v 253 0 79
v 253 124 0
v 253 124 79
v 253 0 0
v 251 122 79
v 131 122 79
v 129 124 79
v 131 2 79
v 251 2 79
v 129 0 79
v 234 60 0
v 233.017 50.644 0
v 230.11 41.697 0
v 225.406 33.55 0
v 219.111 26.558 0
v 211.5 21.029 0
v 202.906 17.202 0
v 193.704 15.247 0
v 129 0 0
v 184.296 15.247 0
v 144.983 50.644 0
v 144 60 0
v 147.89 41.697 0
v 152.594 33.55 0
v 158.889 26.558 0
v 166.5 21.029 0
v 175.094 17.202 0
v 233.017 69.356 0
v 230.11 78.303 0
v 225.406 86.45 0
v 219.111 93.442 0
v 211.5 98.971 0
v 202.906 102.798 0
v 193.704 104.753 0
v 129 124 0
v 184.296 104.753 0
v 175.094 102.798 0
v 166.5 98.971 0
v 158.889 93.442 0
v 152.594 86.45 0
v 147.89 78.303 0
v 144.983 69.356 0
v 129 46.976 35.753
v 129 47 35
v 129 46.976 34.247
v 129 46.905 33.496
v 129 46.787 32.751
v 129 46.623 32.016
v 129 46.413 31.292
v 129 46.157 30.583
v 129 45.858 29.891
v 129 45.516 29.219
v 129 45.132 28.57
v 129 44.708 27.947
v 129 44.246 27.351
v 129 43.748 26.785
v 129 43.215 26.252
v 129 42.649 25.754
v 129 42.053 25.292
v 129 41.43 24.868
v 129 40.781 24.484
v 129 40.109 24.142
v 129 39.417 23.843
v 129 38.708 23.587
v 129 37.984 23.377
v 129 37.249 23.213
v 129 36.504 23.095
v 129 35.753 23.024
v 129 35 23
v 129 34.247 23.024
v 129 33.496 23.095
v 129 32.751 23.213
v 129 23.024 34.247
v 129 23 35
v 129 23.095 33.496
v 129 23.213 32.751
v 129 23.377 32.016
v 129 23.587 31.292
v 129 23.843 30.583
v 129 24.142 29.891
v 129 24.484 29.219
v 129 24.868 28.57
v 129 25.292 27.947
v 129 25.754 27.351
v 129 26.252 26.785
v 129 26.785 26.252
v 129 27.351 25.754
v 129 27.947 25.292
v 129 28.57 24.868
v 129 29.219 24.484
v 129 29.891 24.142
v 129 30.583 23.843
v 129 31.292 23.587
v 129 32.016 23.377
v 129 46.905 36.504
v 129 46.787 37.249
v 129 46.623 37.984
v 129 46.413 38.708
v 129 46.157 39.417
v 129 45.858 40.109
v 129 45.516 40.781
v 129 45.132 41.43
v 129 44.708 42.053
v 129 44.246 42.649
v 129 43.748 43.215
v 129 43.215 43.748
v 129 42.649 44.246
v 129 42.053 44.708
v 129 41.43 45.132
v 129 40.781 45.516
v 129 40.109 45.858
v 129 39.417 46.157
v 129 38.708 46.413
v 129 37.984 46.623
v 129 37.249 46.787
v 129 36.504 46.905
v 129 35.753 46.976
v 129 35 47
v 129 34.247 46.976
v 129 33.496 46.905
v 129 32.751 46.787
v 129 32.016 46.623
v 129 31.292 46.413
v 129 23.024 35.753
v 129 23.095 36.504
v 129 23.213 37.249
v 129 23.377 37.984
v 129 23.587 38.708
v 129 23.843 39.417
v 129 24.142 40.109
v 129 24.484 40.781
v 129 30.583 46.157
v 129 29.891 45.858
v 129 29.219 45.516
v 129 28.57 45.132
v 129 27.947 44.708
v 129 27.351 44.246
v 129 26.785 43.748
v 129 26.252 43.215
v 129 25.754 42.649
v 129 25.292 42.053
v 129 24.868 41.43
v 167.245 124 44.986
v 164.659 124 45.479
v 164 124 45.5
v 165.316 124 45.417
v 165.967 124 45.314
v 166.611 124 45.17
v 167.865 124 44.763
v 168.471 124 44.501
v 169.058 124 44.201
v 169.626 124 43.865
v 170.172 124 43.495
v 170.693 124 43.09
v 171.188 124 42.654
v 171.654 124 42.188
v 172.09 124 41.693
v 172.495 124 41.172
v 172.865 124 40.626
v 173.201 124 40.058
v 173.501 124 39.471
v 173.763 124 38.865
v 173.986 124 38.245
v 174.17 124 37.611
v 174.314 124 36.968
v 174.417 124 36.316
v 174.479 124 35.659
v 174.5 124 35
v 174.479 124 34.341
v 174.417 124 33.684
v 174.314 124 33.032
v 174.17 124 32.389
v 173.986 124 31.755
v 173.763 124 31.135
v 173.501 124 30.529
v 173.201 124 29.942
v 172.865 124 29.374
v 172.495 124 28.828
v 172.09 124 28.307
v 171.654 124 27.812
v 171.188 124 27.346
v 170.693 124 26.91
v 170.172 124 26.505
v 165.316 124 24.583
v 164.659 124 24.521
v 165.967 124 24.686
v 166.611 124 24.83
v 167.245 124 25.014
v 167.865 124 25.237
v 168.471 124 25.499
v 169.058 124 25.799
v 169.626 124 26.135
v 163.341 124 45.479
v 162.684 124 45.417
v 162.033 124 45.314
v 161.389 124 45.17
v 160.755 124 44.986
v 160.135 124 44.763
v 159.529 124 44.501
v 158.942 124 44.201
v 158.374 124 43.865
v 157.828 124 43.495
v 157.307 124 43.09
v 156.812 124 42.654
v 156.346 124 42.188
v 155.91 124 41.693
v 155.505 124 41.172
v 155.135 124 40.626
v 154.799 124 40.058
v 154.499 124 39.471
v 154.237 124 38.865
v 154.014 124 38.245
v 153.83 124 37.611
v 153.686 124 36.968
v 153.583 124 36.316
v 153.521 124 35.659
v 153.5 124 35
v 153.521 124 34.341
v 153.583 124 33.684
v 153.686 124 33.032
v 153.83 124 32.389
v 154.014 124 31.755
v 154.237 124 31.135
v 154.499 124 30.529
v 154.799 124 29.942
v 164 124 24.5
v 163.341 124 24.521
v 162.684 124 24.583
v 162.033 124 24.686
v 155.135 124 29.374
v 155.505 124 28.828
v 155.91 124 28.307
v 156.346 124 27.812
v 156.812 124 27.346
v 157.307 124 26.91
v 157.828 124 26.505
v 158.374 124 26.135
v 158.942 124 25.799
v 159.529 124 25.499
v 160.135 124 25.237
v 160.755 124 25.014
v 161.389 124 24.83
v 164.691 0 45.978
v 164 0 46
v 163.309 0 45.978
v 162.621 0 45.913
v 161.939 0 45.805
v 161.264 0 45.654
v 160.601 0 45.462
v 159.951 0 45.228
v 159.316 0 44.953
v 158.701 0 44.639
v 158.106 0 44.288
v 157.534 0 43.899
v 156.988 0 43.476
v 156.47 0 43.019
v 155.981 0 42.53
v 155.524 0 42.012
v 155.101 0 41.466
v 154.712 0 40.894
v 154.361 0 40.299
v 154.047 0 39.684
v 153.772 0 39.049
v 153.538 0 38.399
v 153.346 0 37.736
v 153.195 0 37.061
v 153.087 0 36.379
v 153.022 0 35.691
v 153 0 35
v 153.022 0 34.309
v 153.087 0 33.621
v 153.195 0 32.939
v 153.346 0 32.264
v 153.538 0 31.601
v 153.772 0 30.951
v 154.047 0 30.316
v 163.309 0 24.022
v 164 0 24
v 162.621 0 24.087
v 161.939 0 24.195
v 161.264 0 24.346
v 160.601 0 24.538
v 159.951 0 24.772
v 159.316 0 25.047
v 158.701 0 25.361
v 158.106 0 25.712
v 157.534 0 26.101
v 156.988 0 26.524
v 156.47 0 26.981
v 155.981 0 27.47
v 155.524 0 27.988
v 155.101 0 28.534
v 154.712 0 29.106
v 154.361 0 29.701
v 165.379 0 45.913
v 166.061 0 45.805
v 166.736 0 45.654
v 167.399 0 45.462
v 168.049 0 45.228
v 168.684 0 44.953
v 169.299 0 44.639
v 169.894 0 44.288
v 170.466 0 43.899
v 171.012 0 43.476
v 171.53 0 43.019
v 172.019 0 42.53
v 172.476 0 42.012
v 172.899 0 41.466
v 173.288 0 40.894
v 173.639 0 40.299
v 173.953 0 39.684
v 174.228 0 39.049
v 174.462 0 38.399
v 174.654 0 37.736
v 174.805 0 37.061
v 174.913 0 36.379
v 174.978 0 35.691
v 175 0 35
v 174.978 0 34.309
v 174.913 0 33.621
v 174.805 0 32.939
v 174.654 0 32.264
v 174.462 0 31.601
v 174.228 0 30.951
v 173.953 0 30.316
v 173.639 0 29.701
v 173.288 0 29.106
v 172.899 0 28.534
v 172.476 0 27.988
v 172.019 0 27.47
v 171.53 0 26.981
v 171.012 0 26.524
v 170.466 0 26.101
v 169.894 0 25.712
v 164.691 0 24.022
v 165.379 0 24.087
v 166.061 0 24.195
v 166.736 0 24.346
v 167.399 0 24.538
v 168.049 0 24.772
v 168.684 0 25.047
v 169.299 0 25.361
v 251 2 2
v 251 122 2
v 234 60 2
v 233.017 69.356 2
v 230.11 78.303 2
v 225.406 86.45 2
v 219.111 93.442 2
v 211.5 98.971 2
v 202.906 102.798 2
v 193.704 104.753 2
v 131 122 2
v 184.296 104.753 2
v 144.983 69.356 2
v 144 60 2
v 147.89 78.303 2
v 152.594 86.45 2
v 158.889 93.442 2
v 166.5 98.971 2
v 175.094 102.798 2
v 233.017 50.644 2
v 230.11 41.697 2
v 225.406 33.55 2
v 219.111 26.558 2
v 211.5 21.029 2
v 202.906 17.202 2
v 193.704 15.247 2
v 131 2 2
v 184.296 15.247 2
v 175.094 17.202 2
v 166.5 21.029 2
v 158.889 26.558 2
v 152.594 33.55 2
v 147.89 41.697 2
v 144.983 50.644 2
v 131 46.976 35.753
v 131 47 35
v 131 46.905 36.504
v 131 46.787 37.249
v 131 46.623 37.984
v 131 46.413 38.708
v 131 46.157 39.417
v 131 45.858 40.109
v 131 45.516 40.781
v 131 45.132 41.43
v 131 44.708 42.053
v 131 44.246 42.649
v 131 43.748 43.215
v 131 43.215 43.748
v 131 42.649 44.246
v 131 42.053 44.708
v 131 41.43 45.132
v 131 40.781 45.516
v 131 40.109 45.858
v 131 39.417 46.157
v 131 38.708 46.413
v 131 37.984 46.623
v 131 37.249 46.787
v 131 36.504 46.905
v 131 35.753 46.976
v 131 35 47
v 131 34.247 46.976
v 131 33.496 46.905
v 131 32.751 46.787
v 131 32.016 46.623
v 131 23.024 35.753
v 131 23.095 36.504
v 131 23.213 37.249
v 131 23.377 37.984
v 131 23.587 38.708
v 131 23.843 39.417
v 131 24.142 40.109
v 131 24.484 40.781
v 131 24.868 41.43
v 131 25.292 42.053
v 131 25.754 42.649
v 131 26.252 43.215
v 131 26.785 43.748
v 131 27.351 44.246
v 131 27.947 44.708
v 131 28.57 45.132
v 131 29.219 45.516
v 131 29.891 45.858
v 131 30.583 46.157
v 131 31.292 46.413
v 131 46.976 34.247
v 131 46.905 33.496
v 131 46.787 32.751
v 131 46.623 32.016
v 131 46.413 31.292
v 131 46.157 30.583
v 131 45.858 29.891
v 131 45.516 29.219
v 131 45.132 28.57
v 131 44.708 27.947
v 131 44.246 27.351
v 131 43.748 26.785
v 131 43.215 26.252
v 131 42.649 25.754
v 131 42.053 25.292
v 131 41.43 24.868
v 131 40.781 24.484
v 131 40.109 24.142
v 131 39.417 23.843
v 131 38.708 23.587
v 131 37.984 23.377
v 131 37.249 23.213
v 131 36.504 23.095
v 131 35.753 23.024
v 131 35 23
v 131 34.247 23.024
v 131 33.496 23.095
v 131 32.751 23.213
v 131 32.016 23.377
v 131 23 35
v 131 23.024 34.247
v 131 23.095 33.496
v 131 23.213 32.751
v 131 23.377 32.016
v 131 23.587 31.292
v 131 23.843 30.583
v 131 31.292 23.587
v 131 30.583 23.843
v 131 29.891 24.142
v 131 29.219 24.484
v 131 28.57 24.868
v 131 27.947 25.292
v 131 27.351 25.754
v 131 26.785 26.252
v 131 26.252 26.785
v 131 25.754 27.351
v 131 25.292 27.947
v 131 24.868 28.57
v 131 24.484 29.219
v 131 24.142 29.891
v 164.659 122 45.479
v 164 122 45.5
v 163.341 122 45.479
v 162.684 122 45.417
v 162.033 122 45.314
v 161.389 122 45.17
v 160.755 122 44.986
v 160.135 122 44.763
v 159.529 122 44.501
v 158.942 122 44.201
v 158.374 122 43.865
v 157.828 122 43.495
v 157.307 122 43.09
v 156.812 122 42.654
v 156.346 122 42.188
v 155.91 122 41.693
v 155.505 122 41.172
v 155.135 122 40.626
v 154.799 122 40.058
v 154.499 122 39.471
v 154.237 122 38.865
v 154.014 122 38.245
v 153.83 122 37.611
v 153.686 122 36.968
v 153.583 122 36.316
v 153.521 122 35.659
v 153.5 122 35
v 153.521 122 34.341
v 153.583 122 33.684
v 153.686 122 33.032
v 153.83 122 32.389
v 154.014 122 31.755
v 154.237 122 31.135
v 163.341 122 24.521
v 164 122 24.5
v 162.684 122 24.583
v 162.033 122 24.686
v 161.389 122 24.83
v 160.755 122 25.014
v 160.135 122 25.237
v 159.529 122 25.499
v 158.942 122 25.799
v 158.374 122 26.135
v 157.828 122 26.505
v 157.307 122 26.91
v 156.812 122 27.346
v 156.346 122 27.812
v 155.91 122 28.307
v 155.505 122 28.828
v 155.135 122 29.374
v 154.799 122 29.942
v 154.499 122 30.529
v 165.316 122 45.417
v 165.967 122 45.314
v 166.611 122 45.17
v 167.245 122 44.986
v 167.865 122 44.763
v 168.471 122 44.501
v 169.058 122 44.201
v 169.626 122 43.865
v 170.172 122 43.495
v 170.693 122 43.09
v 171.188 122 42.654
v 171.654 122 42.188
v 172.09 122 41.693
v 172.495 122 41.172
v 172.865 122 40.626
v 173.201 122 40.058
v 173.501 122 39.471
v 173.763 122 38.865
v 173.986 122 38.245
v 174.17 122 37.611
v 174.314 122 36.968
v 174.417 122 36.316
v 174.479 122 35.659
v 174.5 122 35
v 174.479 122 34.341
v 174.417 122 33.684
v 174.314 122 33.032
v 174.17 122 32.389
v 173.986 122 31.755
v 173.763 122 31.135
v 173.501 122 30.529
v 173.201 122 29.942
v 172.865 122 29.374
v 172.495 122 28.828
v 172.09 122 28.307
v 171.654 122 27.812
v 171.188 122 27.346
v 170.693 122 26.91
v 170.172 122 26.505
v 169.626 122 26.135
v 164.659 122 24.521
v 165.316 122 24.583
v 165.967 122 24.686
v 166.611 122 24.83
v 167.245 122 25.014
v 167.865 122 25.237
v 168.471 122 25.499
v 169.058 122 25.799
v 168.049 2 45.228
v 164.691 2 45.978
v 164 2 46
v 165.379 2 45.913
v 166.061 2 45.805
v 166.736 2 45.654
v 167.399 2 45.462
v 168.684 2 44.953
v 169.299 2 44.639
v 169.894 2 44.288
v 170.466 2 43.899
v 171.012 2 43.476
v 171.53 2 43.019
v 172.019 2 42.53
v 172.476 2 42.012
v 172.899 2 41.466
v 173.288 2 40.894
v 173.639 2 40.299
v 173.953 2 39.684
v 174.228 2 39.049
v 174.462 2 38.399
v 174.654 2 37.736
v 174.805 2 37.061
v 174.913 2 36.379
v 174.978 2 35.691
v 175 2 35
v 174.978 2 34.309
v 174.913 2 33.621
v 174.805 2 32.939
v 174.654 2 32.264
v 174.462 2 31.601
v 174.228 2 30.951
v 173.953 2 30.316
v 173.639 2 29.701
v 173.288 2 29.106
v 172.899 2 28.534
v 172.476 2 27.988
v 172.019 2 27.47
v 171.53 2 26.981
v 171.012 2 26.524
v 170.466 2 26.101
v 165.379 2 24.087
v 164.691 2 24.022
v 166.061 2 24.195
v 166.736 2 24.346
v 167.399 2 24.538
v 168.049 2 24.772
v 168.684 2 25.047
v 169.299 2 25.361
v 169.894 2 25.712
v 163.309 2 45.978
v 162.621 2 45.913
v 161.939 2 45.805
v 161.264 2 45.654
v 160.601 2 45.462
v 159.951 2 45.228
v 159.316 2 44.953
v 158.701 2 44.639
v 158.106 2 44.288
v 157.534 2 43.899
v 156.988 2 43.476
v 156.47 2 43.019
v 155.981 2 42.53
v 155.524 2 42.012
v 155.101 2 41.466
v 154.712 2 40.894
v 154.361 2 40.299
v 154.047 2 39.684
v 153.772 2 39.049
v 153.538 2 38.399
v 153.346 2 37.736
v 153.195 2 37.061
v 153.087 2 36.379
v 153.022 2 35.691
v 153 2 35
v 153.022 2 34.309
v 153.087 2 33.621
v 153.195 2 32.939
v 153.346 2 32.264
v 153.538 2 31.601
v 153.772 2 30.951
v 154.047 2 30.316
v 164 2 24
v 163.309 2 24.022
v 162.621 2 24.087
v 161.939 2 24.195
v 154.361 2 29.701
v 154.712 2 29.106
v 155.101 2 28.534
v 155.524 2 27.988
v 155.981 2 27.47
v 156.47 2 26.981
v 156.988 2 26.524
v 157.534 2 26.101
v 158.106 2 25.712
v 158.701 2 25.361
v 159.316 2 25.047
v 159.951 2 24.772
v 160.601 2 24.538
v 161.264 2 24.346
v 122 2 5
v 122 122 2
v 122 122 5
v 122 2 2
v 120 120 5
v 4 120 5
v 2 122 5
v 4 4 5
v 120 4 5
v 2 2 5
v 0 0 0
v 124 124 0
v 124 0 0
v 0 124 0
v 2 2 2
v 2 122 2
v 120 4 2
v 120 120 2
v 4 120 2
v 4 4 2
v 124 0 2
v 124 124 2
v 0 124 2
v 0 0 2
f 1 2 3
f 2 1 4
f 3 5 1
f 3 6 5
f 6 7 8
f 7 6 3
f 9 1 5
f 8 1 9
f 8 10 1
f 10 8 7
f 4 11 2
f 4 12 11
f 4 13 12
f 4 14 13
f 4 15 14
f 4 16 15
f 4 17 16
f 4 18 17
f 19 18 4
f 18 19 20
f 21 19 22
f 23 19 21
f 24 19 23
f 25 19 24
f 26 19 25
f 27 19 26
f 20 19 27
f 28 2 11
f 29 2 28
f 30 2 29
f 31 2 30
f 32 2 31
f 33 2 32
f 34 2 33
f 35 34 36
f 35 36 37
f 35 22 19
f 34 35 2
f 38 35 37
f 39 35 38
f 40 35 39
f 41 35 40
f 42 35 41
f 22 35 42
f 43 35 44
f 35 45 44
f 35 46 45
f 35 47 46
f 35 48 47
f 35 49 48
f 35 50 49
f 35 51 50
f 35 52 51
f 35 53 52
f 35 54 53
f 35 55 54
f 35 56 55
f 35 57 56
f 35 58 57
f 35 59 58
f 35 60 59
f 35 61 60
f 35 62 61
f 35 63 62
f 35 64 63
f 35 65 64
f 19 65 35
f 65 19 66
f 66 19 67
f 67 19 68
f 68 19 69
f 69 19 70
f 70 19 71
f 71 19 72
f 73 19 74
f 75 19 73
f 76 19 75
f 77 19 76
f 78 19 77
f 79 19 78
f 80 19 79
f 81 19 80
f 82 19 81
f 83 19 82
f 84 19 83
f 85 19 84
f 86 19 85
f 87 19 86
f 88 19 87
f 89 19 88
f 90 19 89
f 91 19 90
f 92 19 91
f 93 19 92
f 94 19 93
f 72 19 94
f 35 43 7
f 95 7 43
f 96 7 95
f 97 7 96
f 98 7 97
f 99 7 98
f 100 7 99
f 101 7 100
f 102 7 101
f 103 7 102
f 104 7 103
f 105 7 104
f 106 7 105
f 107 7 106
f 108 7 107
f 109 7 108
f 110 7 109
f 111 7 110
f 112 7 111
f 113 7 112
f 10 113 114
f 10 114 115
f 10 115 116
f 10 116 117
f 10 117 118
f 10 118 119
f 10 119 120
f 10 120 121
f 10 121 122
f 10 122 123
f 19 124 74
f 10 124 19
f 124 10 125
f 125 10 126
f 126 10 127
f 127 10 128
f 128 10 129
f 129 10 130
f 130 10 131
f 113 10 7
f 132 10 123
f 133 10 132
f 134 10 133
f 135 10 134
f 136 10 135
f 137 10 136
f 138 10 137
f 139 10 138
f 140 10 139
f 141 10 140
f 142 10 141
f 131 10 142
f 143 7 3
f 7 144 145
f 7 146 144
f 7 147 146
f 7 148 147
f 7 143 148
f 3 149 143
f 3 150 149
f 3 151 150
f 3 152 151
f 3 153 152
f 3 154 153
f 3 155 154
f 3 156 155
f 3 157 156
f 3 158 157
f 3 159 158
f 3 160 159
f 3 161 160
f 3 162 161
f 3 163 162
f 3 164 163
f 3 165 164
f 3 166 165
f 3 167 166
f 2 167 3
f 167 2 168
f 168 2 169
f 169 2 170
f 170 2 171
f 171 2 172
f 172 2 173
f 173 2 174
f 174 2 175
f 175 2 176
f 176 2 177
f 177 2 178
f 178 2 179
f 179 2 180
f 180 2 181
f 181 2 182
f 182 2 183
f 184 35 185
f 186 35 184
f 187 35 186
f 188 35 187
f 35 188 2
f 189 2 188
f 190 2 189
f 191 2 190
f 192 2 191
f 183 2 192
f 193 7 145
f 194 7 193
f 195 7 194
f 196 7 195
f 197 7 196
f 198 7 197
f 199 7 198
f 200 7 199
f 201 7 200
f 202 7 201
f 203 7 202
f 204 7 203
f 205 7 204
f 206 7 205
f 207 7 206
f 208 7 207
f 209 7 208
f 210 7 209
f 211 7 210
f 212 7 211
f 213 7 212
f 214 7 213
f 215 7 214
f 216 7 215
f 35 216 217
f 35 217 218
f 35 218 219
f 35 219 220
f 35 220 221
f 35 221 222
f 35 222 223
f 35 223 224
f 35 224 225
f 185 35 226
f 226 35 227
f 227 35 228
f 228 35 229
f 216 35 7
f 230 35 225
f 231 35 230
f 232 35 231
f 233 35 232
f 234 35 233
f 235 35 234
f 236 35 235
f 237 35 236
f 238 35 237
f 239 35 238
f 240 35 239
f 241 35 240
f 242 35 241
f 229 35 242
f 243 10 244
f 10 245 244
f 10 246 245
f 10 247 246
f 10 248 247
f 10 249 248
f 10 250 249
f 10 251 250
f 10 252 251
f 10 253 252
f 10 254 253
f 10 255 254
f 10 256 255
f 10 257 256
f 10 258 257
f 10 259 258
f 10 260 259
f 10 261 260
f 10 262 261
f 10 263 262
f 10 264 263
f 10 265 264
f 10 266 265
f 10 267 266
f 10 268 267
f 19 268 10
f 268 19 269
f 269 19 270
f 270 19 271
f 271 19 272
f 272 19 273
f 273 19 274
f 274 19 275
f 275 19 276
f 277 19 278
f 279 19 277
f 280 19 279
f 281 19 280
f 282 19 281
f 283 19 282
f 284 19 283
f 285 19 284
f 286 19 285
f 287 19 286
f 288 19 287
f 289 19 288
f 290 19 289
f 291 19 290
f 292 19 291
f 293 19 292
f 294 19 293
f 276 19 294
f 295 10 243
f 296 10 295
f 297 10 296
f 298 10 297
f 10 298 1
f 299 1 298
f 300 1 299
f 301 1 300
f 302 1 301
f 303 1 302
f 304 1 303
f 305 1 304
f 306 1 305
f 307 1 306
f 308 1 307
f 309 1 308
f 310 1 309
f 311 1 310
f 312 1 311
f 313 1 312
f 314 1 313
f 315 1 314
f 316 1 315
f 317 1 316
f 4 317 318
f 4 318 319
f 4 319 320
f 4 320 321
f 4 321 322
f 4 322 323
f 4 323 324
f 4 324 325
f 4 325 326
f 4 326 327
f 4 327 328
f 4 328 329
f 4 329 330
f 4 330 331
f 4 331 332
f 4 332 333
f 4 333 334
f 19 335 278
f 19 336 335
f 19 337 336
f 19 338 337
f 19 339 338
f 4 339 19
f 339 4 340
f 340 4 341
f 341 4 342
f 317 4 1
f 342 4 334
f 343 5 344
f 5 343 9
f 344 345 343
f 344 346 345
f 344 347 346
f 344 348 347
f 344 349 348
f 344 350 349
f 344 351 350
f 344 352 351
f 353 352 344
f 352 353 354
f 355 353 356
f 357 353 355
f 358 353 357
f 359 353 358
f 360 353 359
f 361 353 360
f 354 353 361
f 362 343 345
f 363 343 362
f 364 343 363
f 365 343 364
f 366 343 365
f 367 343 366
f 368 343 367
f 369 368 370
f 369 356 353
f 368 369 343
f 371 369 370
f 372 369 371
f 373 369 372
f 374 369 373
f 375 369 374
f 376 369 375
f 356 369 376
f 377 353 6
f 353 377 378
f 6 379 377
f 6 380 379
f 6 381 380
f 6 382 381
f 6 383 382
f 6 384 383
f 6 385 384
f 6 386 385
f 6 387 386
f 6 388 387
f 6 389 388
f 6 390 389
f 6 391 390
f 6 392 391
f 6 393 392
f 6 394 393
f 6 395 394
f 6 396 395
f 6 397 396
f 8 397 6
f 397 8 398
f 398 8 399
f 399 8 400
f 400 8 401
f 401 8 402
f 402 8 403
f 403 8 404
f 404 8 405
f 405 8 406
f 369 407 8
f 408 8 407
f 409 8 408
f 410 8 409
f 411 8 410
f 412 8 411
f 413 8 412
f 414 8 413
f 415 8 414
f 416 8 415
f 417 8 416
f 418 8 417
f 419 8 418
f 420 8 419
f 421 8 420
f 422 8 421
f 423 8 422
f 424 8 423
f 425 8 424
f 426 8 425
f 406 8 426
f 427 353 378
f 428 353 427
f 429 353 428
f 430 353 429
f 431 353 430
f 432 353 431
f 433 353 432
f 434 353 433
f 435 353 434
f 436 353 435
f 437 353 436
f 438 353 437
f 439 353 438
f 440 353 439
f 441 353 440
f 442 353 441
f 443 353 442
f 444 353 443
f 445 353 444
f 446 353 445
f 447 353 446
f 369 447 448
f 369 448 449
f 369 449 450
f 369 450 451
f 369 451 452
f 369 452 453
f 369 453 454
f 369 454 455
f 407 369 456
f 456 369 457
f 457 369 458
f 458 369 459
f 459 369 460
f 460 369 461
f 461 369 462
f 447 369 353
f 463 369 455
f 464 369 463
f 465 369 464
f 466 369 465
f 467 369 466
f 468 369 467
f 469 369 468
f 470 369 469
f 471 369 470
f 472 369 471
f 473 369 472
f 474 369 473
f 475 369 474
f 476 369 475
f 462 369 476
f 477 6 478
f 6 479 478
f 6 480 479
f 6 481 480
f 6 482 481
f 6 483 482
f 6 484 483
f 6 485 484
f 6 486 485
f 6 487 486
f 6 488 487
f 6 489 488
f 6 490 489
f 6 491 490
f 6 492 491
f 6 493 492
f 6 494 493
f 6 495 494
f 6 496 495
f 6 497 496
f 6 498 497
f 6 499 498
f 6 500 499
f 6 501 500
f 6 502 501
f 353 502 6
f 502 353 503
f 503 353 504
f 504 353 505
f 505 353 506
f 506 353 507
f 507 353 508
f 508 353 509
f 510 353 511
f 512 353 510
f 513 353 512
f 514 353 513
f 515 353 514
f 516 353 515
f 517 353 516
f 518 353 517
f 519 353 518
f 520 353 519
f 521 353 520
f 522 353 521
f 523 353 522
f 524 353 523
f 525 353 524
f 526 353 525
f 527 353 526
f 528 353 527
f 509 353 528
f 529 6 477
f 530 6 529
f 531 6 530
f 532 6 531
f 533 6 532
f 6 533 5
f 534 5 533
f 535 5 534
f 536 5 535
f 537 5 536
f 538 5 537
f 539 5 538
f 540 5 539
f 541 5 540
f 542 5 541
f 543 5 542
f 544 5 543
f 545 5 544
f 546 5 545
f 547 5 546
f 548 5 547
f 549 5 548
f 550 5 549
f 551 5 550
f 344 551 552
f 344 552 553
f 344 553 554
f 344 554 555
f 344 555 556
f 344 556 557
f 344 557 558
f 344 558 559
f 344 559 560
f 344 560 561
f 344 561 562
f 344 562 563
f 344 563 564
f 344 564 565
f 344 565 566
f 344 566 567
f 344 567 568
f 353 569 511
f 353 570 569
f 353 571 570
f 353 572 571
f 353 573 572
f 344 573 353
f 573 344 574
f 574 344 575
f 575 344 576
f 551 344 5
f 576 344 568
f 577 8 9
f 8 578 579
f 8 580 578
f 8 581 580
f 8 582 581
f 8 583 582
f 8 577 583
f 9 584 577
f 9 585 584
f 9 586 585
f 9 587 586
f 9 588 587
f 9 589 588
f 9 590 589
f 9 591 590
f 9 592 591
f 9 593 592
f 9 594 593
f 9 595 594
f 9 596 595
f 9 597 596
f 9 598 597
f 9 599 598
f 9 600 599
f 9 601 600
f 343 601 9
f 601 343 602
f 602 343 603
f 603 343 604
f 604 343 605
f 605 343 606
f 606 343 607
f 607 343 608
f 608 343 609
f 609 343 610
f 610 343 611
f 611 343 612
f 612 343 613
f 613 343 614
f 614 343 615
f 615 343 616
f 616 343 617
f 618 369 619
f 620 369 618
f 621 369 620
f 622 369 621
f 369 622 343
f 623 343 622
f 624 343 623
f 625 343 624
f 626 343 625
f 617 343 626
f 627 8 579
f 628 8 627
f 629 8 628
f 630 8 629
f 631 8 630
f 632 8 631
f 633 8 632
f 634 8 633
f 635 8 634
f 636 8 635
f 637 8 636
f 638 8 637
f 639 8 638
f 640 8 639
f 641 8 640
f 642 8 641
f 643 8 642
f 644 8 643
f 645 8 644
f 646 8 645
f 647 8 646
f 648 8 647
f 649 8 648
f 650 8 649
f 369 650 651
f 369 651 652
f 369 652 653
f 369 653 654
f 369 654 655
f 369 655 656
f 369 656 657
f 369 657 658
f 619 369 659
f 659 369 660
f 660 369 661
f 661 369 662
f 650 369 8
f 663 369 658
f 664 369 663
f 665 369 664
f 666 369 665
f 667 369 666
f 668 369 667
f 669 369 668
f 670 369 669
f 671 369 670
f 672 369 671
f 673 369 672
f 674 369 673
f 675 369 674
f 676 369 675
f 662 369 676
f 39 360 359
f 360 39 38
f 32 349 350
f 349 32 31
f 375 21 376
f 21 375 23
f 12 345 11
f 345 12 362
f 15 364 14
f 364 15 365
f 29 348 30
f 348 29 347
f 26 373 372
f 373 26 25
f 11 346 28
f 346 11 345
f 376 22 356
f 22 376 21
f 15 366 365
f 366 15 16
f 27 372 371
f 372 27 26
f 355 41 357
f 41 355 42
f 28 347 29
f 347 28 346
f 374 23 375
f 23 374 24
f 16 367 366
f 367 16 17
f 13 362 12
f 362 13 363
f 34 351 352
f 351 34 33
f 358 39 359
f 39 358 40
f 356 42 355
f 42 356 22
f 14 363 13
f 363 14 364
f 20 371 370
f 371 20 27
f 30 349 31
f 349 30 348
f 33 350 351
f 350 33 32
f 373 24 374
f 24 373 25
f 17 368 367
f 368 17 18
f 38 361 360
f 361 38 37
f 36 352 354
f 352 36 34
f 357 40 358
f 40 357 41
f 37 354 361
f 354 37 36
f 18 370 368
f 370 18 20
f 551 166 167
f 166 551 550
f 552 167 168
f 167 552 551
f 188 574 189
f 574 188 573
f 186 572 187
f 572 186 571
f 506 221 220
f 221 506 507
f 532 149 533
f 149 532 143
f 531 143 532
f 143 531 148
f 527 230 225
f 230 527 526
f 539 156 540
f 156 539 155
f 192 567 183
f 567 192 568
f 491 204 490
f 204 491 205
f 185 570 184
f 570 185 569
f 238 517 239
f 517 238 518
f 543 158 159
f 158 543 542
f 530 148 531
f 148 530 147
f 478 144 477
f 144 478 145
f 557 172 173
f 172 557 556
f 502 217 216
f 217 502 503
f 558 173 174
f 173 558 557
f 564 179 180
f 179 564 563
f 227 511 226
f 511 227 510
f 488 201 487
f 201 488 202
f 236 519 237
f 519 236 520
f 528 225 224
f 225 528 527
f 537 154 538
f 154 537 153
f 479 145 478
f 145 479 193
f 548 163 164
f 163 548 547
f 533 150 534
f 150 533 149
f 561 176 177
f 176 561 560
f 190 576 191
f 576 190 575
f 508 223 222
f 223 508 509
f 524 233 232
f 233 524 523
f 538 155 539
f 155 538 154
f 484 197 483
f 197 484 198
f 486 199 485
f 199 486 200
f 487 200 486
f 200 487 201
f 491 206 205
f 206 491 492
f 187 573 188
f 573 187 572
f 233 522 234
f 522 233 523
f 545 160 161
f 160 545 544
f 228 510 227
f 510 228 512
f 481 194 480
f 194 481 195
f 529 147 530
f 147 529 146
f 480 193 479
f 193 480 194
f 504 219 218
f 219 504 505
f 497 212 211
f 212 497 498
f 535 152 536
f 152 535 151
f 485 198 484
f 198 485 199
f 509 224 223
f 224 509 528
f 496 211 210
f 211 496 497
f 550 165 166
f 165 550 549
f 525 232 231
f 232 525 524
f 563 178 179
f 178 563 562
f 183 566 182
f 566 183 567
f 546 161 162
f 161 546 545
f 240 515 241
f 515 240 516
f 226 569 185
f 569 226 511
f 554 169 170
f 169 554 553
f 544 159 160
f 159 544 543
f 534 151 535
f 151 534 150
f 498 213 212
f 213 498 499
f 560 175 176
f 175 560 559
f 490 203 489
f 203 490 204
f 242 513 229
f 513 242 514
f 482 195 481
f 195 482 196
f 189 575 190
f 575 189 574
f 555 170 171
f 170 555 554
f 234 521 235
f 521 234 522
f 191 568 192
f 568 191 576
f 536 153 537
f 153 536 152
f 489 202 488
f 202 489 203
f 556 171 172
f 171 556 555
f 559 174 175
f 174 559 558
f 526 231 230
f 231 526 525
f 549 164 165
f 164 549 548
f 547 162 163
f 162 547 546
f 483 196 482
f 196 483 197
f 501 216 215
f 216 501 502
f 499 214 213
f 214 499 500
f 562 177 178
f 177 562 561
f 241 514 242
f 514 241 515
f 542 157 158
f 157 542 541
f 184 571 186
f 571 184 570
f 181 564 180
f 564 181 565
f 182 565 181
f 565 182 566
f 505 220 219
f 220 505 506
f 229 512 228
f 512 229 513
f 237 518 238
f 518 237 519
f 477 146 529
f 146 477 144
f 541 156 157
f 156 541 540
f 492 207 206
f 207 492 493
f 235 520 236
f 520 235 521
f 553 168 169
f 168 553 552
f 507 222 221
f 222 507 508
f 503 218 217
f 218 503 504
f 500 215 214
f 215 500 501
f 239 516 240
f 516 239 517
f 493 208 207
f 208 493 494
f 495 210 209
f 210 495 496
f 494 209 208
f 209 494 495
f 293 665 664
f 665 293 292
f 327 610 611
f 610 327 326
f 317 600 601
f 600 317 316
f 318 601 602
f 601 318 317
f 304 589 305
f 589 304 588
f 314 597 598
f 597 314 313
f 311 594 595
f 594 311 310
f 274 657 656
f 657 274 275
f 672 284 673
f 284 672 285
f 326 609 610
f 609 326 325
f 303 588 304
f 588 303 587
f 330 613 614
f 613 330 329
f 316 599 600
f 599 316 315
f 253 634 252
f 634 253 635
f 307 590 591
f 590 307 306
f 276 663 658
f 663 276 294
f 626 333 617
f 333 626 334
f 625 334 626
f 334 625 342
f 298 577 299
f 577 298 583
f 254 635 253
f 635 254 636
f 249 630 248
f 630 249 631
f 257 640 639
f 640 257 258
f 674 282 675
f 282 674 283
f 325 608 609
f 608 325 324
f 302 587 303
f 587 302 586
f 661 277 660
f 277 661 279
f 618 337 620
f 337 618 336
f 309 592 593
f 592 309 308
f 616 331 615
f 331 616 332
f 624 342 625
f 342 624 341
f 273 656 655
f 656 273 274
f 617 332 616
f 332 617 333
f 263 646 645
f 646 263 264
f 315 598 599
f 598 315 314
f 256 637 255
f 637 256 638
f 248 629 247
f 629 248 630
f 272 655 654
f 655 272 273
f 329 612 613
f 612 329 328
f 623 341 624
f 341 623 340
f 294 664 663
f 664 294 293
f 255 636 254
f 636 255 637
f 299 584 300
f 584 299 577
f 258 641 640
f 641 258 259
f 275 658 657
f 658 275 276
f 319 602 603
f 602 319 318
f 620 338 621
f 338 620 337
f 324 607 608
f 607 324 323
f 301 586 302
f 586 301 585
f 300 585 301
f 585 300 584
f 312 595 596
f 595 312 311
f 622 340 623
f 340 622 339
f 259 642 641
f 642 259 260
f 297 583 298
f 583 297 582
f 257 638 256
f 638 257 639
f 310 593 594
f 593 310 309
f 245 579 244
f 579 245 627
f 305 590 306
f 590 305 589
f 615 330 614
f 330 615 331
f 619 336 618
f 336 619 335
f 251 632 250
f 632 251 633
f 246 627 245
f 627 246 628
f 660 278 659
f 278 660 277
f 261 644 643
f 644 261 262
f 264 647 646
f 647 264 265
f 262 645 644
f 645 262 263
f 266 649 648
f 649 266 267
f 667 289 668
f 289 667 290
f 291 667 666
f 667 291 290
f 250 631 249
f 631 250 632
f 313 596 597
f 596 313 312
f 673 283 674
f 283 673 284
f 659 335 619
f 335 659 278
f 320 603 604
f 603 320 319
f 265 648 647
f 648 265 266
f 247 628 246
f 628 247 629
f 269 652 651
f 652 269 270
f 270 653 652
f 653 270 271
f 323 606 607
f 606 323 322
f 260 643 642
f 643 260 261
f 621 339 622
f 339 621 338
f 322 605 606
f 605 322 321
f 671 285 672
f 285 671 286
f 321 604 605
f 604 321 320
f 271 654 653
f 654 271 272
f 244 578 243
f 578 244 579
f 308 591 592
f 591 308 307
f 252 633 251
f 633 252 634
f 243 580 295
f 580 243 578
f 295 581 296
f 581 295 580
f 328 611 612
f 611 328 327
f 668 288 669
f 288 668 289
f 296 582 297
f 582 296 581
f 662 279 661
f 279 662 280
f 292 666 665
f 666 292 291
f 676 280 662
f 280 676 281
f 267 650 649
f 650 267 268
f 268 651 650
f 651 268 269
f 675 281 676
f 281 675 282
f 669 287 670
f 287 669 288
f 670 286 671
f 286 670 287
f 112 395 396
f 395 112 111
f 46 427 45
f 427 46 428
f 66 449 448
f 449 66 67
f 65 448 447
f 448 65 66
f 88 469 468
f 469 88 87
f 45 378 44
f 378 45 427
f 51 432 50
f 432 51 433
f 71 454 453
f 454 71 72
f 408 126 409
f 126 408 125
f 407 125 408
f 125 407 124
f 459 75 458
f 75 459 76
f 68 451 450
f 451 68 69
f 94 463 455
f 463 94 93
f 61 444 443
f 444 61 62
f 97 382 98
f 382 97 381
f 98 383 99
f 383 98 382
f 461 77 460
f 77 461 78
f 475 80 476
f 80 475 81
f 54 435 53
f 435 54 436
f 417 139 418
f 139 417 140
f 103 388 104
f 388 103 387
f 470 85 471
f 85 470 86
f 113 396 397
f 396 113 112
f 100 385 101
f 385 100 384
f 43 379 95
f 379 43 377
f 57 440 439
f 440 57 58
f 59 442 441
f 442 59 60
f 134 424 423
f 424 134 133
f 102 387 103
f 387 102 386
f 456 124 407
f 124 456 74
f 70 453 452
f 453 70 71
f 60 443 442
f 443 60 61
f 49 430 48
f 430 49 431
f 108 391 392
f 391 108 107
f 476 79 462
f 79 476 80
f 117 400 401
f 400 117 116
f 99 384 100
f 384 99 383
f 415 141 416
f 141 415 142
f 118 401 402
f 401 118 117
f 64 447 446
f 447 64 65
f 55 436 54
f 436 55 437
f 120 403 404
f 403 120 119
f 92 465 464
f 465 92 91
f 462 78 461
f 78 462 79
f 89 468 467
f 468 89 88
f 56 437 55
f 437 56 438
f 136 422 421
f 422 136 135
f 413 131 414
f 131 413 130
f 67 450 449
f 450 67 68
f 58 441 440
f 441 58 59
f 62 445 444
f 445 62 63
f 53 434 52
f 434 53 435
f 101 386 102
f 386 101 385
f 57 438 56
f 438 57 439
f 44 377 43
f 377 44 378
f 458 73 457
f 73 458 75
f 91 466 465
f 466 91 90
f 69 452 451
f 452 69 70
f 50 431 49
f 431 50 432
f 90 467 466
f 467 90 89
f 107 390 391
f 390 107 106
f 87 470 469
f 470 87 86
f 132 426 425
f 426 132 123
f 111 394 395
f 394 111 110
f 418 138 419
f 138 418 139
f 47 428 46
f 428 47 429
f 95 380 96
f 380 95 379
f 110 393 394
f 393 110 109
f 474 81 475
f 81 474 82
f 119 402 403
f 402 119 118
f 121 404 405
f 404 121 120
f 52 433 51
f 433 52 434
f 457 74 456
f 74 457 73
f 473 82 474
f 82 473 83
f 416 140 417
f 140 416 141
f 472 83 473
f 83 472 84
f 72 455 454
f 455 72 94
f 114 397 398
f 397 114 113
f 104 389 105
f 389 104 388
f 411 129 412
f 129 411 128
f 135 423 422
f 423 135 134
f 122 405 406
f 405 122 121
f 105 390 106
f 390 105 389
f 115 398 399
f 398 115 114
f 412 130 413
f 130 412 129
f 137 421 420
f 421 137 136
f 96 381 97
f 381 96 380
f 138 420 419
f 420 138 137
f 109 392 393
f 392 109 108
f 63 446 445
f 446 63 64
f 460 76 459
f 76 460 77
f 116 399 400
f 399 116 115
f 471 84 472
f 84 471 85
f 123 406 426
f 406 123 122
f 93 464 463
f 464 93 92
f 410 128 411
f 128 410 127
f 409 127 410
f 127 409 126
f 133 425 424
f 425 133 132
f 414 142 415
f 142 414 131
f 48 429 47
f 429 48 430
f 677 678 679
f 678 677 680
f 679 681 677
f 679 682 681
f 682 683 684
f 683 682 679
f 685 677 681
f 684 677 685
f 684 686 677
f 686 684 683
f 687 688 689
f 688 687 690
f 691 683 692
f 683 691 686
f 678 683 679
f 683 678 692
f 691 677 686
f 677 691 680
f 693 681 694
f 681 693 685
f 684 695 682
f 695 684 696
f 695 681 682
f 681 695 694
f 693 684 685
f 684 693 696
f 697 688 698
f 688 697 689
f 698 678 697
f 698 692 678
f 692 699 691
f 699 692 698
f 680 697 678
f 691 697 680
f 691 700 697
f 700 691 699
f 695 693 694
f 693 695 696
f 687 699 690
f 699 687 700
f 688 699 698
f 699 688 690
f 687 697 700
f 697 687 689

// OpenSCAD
inside_x=120;
inside_y=120;
inside_z=75;
borders_z=5;
borders_width=2;
//deck
box_x=inside_x+borders_width*2;
box_y=inside_y+borders_width*2;
deck_z=2;
//only for box
//holes
hole1_radius=10.5;
hole_x=35;
hole_z=35;
//hole2
hole2_radius=11;
hole2_x=35;
hole2_z=35;
//hole3
hole3_radius=12;
hole3_x=35;
hole3_z=35;
//box
box_z=inside_z+borders_width+deck_z;
//displayhole
disp_x=90;
//disp_y=20;
movedisp_x=inside_x/2;
movedisp_y=inside_y/2;

module deck1() {
cube([box_x,box_y,deck_z]);
}


module squareBorders(x_length,y_length,z_length,width){
difference(){
    //outer
cube([x_length,y_length,z_length]);
    //inside cutter
translate([width,width,-1]) cube([x_length-2*width,y_length-2*width,z_length+3]);
}
}

module deck(){
deck1();    
translate([borders_width,borders_width,0]) squareBorders(box_x-2*borders_width,box_y-2*borders_width,borders_z,borders_width);
}

//box


module box1() {
difference(){
cube([box_x,box_y,box_z]);
translate([borders_width,borders_width,borders_width]) cube([box_x-borders_width*2,box_y-borders_width*2,box_z+9]);
translate([movedisp_x,movedisp_y,0]) cylinder(h=deck_z,d=disp_x); //displayhole
            }
}

module cylinderCut(rott1,rott2=0,rott3=0,rad){
rotate([rott1,rott2,rott3]) cylinder(h=borders_width+5,r=rad, $fn=100); //cylinder for cutting holes for wires
}

module cylinderTube(){

}

module boxWithHoles(){    
translate([box_x+5,0,0]){    
difference(){
box1();
//translate([18,3,hole_z]) cylinderCut();
//translate([28,3,hole_z]) cylinderCut();
#translate([hole_x,box_y+1,hole_z]) cylinderCut(90,0,0,hole1_radius); //hole1
#translate([hole2_x,2,hole2_z]) cylinderCut(90,0,0,hole2_radius); //hole2
#translate([0,hole3_x,hole3_z]) cylinderCut(0,90,0,hole3_radius); //hole2

//translate([28,box_y+1,hole_z]) cylinderCut();
}}
}

boxWithHoles();
deck();
